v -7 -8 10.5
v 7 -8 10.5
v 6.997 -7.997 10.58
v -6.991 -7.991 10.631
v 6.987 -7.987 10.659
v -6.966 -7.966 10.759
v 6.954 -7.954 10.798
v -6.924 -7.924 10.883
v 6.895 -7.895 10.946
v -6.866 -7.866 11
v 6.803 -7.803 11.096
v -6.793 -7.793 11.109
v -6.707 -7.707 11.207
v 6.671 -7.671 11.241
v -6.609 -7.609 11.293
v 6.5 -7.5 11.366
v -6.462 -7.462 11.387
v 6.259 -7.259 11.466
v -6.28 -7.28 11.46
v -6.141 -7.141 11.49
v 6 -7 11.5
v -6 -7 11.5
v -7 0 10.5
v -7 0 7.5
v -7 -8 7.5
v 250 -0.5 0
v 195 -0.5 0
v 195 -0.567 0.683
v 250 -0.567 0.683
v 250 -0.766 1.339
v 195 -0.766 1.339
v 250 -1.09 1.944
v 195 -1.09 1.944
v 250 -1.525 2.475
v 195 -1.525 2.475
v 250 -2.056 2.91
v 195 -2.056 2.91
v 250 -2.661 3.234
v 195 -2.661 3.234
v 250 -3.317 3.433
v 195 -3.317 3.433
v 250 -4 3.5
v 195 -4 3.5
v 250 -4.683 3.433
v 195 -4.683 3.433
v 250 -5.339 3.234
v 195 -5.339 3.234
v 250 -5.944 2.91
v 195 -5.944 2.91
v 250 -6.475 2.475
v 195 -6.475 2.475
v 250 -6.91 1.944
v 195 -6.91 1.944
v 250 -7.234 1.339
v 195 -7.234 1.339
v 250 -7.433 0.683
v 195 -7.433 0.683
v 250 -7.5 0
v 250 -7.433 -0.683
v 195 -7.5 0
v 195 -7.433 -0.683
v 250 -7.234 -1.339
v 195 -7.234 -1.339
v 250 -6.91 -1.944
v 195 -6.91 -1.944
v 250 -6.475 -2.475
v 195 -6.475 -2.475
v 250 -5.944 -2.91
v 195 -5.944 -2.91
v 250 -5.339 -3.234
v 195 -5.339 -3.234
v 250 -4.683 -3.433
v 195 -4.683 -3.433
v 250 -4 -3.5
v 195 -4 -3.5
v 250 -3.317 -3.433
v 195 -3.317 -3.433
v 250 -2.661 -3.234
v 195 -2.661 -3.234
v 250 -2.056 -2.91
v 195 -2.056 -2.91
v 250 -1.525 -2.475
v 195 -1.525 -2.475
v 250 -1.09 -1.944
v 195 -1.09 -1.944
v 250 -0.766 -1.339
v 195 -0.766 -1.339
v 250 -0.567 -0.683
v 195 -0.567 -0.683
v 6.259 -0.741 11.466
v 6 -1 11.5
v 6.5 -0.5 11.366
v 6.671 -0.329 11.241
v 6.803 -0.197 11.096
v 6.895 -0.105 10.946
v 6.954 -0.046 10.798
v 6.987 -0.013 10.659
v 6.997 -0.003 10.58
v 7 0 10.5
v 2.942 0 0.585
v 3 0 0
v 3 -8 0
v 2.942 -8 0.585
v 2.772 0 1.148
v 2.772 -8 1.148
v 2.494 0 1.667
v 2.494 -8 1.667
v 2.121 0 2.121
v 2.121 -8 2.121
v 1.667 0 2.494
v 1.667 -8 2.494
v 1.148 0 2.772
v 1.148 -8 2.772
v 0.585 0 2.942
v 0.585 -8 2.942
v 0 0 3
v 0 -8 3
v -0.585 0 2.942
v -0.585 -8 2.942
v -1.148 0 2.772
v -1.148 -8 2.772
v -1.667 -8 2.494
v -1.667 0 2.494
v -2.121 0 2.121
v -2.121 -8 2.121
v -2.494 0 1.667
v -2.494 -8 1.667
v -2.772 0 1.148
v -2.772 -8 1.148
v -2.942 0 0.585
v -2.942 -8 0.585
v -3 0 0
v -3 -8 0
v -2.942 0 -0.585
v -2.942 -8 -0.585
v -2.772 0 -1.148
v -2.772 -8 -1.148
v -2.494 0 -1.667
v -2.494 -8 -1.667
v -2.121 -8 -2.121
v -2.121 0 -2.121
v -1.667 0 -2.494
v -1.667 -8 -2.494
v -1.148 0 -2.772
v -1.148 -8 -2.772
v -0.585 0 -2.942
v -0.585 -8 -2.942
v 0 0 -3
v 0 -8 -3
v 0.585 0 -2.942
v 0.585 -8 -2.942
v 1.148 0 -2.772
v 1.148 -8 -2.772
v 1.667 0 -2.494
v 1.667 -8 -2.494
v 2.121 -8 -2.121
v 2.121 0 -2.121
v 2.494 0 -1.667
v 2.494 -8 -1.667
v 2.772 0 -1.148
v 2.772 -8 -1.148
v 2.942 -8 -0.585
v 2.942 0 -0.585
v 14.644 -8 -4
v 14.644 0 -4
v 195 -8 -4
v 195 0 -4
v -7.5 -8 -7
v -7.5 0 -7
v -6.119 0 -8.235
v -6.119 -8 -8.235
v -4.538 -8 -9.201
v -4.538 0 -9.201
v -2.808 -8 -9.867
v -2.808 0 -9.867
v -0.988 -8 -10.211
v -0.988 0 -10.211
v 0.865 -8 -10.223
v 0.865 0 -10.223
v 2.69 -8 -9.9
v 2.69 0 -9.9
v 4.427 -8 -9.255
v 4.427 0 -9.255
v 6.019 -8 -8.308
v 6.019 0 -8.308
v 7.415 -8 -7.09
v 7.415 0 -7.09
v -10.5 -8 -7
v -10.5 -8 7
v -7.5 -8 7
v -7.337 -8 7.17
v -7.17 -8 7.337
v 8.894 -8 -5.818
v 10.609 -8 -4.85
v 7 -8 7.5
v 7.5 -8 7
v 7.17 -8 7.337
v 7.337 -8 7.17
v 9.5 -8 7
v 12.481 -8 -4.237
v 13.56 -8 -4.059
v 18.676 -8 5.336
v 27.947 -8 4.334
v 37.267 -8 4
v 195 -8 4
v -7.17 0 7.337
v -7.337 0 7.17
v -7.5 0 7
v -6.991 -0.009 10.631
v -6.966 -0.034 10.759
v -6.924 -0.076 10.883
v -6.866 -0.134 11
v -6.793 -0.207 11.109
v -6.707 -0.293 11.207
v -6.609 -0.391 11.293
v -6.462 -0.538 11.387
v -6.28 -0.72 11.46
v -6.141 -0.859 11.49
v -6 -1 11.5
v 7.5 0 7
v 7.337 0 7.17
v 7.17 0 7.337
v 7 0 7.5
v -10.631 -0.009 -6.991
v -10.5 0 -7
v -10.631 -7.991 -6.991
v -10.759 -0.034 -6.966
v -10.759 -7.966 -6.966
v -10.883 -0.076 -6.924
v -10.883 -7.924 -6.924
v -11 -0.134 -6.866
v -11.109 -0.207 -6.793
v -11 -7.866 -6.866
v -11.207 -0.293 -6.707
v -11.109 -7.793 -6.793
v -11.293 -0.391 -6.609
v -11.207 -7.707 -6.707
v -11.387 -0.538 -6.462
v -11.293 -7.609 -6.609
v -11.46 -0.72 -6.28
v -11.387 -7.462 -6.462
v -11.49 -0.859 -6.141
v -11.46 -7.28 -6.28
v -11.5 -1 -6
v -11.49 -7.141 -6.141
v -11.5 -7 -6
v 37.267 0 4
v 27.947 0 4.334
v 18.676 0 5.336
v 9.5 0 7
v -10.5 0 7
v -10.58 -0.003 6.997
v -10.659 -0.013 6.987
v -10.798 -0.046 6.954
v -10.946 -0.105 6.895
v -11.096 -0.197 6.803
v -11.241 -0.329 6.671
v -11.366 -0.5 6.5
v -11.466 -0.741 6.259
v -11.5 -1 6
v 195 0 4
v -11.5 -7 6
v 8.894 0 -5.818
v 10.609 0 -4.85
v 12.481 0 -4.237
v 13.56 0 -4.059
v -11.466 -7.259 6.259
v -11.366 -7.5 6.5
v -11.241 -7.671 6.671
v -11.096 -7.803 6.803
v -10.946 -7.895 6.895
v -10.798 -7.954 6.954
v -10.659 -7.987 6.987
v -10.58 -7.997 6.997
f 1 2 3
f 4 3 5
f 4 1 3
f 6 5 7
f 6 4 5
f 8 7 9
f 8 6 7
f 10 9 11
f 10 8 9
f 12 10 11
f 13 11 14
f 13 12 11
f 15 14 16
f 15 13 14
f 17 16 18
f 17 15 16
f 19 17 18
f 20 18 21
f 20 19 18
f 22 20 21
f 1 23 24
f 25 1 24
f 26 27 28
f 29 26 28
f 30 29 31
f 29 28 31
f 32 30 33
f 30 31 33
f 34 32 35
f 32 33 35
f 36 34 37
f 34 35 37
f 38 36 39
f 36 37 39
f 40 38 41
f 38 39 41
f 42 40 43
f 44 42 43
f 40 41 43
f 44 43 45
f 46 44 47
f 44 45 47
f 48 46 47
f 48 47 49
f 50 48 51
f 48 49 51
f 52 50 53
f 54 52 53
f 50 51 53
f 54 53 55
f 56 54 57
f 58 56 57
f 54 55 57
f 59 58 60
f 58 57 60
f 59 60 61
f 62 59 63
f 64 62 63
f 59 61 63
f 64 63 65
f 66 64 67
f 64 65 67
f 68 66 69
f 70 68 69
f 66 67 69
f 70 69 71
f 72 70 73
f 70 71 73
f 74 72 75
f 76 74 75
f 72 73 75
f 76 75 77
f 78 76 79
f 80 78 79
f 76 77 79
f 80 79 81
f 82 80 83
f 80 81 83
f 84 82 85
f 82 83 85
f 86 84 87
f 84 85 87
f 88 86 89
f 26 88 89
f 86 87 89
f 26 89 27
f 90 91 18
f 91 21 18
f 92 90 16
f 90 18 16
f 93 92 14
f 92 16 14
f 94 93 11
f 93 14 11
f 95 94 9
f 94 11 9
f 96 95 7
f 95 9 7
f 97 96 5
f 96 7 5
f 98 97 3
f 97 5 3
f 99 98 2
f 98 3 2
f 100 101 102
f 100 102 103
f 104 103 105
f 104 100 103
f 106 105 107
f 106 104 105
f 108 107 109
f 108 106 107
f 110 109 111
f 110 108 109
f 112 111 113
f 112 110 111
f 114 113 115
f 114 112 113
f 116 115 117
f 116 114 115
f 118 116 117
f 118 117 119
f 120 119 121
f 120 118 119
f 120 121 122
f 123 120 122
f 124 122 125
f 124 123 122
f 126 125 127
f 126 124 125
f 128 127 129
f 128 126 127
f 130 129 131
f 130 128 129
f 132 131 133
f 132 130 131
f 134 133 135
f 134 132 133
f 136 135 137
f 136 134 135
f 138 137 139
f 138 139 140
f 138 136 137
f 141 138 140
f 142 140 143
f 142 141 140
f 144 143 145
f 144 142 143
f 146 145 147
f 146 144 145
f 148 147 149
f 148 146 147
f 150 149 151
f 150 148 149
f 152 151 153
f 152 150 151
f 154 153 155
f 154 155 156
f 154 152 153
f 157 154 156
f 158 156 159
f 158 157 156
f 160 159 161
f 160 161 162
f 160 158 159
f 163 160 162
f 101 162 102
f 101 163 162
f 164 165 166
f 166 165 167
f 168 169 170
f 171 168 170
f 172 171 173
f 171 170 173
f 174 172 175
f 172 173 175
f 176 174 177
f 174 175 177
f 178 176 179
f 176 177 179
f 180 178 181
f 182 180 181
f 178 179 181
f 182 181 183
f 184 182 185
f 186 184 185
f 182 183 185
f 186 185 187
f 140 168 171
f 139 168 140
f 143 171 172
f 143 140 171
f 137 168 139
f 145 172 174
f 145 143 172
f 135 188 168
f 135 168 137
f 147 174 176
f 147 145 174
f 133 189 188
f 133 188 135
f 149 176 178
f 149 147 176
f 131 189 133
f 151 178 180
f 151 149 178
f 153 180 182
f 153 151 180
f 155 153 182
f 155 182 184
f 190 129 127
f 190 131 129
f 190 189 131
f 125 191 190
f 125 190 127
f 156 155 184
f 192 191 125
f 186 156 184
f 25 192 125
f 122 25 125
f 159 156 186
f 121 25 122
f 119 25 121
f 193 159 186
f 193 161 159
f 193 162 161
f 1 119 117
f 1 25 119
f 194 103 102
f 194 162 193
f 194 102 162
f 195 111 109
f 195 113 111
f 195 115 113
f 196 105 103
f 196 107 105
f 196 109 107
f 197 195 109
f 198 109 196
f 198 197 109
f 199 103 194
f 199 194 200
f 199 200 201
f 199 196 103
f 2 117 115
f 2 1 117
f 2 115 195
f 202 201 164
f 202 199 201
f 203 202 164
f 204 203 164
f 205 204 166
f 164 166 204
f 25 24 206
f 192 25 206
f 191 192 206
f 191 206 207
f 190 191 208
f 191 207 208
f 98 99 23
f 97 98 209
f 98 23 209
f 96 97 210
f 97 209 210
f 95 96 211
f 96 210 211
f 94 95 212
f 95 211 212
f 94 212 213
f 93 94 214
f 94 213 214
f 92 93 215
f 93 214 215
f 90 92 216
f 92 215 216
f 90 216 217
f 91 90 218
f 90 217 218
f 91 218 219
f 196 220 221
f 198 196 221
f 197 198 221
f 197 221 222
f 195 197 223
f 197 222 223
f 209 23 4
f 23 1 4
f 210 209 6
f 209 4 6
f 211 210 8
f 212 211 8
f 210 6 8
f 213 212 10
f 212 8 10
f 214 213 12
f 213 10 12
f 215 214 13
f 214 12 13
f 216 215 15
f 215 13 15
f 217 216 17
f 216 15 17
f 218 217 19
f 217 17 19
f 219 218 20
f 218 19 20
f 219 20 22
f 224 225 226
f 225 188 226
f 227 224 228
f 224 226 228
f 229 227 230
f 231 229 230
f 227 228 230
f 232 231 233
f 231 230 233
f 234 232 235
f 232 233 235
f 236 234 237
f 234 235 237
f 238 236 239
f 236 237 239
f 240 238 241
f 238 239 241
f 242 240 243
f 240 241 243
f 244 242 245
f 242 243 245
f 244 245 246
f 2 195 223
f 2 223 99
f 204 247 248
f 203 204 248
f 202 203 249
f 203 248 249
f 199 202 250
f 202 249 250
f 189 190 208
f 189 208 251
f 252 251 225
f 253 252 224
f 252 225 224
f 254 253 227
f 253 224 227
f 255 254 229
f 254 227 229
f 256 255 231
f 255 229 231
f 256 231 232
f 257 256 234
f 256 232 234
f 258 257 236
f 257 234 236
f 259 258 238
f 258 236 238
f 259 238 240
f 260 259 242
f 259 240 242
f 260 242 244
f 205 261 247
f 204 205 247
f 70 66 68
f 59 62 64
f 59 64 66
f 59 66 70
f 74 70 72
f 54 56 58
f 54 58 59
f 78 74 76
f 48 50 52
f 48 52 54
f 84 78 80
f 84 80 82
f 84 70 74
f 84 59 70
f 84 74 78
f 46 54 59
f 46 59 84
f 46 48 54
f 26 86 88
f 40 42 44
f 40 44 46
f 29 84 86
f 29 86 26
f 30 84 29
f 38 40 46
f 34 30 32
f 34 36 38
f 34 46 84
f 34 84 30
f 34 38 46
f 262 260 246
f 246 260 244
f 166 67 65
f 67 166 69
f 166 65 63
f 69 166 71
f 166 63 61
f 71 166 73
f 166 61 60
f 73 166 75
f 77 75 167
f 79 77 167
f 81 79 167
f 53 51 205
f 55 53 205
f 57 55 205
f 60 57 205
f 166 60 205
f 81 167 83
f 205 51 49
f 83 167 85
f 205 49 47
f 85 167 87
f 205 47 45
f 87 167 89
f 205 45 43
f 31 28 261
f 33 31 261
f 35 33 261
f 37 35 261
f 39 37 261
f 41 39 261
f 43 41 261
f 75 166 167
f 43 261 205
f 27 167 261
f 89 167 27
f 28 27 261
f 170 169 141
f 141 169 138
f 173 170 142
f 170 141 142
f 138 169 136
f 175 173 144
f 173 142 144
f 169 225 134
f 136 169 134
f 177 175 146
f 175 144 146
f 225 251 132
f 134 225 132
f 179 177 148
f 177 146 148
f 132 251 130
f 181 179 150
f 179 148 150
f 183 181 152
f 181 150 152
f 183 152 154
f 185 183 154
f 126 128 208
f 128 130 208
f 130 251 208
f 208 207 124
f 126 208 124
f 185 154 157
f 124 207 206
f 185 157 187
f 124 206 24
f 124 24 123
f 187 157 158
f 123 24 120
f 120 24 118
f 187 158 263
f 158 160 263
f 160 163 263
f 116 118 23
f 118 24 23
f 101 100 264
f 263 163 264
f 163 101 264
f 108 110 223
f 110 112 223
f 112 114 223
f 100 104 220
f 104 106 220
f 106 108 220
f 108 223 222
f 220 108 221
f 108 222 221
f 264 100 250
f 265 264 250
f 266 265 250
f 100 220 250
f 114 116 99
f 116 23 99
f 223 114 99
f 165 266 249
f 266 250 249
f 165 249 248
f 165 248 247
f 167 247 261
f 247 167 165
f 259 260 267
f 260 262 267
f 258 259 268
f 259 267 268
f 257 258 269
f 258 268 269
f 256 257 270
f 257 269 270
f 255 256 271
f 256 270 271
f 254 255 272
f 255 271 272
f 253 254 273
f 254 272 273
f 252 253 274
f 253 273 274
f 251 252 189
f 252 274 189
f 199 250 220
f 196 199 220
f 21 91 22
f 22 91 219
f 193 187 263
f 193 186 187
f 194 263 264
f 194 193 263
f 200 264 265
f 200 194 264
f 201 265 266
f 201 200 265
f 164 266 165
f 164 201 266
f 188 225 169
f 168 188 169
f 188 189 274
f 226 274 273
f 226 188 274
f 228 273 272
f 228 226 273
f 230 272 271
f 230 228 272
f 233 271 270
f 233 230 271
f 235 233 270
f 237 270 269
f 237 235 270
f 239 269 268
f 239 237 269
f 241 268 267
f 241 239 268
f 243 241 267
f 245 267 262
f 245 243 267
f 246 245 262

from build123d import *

# Parameters (mm, degrees)
F0_R        = 3
F1_DEPTH    = 8
F2_R        = 10
F3_T1_DEPTH = 8
F4_R        = 1
F5_R        = 3.5
F6_DEPTH    = 55


# Not quite as in the source:
# - a fillet or chamfer that OpenCascade refuses, or shapes differently, is made with other operations: its cross-section is extruded or revolved along the edge and cut away or added


with BuildPart() as f1:
    # F0 (on Front) → F1 (new body)
    with BuildSketch(Plane.XZ):
        with BuildLine():
            Line((-7.5, 7), (-11.5, 7))
            Line((-11.5, 7), (-11.5, -7))
            Line((-11.5, -7), (-7.5, -7))
            ThreePointArc((-7.5, -7), (0, -10.2591422643), (7.5, -7))
            ThreePointArc((7.5, -7), (8.6053519278, -5.5855096632), (9.4472218138, -4))
            Line((9.4472218138, -4), (9.5, -4))
            Line((9.5, -4), (195, -4))
            Line((195, -4), (195, 4))
            Line((195, 4), (9.5, 4))
            Line((9.5, 4), (9.5, 7))
            Line((9.5, 7), (7.5, 7))
            ThreePointArc((7.5, 7), (7.2543090643, 7.2543090643), (7, 7.5))
            Line((7, 7.5), (7, 11.5))
            Line((7, 11.5), (-7, 11.5))
            Line((-7, 11.5), (-7, 7.5))
            ThreePointArc((-7, 7.5), (-7.2543090643, 7.2543090643), (-7.5, 7))
        make_face()
        Circle(F0_R, mode=Mode.SUBTRACT)
    extrude(amount=F1_DEPTH)

    # F2
    f2_edges = [f1.edges().sort_by_distance(p)[0] for p in [
        (9.447222, -4, -4),
    ]]
    fillet(f2_edges, radius=F2_R)

    # F3: fillet of radius 130 on 1 edges, made by hand

    # F3_s2 → F3_t1 (join)
    with BuildSketch(Plane.XZ):
        with BuildLine():
            ThreePointArc((37.2668867538, 4), (23.3026467101, 4.7521760338), (9.5, 7))
            Line((9.5, 7), (9.5, 4))
            Line((9.5, 4), (37.2668867538, 4))
        make_face()
    extrude(amount=F3_T1_DEPTH)

    # F4
    f4_edges = [f1.edges().sort_by_distance(p)[0] for p in [
        (7, -4, 11.5),
        (-7, -4, 11.5),
        (0, 0, 11.5),
        (0, -8, 11.5),
        (-11.5, -4, 7),
        (-11.5, -4, -7),
        (-11.5, 0, 0),
        (-11.5, -8, 0),
    ]]
    fillet(f4_edges, radius=F4_R)

    # F5 (on face) → F6 (join)
    with BuildSketch(Plane.YZ.offset(195)):
        with Locations((-4, 0)):
            Circle(F5_R)
    extrude(amount=F6_DEPTH)


solid = f1.part
